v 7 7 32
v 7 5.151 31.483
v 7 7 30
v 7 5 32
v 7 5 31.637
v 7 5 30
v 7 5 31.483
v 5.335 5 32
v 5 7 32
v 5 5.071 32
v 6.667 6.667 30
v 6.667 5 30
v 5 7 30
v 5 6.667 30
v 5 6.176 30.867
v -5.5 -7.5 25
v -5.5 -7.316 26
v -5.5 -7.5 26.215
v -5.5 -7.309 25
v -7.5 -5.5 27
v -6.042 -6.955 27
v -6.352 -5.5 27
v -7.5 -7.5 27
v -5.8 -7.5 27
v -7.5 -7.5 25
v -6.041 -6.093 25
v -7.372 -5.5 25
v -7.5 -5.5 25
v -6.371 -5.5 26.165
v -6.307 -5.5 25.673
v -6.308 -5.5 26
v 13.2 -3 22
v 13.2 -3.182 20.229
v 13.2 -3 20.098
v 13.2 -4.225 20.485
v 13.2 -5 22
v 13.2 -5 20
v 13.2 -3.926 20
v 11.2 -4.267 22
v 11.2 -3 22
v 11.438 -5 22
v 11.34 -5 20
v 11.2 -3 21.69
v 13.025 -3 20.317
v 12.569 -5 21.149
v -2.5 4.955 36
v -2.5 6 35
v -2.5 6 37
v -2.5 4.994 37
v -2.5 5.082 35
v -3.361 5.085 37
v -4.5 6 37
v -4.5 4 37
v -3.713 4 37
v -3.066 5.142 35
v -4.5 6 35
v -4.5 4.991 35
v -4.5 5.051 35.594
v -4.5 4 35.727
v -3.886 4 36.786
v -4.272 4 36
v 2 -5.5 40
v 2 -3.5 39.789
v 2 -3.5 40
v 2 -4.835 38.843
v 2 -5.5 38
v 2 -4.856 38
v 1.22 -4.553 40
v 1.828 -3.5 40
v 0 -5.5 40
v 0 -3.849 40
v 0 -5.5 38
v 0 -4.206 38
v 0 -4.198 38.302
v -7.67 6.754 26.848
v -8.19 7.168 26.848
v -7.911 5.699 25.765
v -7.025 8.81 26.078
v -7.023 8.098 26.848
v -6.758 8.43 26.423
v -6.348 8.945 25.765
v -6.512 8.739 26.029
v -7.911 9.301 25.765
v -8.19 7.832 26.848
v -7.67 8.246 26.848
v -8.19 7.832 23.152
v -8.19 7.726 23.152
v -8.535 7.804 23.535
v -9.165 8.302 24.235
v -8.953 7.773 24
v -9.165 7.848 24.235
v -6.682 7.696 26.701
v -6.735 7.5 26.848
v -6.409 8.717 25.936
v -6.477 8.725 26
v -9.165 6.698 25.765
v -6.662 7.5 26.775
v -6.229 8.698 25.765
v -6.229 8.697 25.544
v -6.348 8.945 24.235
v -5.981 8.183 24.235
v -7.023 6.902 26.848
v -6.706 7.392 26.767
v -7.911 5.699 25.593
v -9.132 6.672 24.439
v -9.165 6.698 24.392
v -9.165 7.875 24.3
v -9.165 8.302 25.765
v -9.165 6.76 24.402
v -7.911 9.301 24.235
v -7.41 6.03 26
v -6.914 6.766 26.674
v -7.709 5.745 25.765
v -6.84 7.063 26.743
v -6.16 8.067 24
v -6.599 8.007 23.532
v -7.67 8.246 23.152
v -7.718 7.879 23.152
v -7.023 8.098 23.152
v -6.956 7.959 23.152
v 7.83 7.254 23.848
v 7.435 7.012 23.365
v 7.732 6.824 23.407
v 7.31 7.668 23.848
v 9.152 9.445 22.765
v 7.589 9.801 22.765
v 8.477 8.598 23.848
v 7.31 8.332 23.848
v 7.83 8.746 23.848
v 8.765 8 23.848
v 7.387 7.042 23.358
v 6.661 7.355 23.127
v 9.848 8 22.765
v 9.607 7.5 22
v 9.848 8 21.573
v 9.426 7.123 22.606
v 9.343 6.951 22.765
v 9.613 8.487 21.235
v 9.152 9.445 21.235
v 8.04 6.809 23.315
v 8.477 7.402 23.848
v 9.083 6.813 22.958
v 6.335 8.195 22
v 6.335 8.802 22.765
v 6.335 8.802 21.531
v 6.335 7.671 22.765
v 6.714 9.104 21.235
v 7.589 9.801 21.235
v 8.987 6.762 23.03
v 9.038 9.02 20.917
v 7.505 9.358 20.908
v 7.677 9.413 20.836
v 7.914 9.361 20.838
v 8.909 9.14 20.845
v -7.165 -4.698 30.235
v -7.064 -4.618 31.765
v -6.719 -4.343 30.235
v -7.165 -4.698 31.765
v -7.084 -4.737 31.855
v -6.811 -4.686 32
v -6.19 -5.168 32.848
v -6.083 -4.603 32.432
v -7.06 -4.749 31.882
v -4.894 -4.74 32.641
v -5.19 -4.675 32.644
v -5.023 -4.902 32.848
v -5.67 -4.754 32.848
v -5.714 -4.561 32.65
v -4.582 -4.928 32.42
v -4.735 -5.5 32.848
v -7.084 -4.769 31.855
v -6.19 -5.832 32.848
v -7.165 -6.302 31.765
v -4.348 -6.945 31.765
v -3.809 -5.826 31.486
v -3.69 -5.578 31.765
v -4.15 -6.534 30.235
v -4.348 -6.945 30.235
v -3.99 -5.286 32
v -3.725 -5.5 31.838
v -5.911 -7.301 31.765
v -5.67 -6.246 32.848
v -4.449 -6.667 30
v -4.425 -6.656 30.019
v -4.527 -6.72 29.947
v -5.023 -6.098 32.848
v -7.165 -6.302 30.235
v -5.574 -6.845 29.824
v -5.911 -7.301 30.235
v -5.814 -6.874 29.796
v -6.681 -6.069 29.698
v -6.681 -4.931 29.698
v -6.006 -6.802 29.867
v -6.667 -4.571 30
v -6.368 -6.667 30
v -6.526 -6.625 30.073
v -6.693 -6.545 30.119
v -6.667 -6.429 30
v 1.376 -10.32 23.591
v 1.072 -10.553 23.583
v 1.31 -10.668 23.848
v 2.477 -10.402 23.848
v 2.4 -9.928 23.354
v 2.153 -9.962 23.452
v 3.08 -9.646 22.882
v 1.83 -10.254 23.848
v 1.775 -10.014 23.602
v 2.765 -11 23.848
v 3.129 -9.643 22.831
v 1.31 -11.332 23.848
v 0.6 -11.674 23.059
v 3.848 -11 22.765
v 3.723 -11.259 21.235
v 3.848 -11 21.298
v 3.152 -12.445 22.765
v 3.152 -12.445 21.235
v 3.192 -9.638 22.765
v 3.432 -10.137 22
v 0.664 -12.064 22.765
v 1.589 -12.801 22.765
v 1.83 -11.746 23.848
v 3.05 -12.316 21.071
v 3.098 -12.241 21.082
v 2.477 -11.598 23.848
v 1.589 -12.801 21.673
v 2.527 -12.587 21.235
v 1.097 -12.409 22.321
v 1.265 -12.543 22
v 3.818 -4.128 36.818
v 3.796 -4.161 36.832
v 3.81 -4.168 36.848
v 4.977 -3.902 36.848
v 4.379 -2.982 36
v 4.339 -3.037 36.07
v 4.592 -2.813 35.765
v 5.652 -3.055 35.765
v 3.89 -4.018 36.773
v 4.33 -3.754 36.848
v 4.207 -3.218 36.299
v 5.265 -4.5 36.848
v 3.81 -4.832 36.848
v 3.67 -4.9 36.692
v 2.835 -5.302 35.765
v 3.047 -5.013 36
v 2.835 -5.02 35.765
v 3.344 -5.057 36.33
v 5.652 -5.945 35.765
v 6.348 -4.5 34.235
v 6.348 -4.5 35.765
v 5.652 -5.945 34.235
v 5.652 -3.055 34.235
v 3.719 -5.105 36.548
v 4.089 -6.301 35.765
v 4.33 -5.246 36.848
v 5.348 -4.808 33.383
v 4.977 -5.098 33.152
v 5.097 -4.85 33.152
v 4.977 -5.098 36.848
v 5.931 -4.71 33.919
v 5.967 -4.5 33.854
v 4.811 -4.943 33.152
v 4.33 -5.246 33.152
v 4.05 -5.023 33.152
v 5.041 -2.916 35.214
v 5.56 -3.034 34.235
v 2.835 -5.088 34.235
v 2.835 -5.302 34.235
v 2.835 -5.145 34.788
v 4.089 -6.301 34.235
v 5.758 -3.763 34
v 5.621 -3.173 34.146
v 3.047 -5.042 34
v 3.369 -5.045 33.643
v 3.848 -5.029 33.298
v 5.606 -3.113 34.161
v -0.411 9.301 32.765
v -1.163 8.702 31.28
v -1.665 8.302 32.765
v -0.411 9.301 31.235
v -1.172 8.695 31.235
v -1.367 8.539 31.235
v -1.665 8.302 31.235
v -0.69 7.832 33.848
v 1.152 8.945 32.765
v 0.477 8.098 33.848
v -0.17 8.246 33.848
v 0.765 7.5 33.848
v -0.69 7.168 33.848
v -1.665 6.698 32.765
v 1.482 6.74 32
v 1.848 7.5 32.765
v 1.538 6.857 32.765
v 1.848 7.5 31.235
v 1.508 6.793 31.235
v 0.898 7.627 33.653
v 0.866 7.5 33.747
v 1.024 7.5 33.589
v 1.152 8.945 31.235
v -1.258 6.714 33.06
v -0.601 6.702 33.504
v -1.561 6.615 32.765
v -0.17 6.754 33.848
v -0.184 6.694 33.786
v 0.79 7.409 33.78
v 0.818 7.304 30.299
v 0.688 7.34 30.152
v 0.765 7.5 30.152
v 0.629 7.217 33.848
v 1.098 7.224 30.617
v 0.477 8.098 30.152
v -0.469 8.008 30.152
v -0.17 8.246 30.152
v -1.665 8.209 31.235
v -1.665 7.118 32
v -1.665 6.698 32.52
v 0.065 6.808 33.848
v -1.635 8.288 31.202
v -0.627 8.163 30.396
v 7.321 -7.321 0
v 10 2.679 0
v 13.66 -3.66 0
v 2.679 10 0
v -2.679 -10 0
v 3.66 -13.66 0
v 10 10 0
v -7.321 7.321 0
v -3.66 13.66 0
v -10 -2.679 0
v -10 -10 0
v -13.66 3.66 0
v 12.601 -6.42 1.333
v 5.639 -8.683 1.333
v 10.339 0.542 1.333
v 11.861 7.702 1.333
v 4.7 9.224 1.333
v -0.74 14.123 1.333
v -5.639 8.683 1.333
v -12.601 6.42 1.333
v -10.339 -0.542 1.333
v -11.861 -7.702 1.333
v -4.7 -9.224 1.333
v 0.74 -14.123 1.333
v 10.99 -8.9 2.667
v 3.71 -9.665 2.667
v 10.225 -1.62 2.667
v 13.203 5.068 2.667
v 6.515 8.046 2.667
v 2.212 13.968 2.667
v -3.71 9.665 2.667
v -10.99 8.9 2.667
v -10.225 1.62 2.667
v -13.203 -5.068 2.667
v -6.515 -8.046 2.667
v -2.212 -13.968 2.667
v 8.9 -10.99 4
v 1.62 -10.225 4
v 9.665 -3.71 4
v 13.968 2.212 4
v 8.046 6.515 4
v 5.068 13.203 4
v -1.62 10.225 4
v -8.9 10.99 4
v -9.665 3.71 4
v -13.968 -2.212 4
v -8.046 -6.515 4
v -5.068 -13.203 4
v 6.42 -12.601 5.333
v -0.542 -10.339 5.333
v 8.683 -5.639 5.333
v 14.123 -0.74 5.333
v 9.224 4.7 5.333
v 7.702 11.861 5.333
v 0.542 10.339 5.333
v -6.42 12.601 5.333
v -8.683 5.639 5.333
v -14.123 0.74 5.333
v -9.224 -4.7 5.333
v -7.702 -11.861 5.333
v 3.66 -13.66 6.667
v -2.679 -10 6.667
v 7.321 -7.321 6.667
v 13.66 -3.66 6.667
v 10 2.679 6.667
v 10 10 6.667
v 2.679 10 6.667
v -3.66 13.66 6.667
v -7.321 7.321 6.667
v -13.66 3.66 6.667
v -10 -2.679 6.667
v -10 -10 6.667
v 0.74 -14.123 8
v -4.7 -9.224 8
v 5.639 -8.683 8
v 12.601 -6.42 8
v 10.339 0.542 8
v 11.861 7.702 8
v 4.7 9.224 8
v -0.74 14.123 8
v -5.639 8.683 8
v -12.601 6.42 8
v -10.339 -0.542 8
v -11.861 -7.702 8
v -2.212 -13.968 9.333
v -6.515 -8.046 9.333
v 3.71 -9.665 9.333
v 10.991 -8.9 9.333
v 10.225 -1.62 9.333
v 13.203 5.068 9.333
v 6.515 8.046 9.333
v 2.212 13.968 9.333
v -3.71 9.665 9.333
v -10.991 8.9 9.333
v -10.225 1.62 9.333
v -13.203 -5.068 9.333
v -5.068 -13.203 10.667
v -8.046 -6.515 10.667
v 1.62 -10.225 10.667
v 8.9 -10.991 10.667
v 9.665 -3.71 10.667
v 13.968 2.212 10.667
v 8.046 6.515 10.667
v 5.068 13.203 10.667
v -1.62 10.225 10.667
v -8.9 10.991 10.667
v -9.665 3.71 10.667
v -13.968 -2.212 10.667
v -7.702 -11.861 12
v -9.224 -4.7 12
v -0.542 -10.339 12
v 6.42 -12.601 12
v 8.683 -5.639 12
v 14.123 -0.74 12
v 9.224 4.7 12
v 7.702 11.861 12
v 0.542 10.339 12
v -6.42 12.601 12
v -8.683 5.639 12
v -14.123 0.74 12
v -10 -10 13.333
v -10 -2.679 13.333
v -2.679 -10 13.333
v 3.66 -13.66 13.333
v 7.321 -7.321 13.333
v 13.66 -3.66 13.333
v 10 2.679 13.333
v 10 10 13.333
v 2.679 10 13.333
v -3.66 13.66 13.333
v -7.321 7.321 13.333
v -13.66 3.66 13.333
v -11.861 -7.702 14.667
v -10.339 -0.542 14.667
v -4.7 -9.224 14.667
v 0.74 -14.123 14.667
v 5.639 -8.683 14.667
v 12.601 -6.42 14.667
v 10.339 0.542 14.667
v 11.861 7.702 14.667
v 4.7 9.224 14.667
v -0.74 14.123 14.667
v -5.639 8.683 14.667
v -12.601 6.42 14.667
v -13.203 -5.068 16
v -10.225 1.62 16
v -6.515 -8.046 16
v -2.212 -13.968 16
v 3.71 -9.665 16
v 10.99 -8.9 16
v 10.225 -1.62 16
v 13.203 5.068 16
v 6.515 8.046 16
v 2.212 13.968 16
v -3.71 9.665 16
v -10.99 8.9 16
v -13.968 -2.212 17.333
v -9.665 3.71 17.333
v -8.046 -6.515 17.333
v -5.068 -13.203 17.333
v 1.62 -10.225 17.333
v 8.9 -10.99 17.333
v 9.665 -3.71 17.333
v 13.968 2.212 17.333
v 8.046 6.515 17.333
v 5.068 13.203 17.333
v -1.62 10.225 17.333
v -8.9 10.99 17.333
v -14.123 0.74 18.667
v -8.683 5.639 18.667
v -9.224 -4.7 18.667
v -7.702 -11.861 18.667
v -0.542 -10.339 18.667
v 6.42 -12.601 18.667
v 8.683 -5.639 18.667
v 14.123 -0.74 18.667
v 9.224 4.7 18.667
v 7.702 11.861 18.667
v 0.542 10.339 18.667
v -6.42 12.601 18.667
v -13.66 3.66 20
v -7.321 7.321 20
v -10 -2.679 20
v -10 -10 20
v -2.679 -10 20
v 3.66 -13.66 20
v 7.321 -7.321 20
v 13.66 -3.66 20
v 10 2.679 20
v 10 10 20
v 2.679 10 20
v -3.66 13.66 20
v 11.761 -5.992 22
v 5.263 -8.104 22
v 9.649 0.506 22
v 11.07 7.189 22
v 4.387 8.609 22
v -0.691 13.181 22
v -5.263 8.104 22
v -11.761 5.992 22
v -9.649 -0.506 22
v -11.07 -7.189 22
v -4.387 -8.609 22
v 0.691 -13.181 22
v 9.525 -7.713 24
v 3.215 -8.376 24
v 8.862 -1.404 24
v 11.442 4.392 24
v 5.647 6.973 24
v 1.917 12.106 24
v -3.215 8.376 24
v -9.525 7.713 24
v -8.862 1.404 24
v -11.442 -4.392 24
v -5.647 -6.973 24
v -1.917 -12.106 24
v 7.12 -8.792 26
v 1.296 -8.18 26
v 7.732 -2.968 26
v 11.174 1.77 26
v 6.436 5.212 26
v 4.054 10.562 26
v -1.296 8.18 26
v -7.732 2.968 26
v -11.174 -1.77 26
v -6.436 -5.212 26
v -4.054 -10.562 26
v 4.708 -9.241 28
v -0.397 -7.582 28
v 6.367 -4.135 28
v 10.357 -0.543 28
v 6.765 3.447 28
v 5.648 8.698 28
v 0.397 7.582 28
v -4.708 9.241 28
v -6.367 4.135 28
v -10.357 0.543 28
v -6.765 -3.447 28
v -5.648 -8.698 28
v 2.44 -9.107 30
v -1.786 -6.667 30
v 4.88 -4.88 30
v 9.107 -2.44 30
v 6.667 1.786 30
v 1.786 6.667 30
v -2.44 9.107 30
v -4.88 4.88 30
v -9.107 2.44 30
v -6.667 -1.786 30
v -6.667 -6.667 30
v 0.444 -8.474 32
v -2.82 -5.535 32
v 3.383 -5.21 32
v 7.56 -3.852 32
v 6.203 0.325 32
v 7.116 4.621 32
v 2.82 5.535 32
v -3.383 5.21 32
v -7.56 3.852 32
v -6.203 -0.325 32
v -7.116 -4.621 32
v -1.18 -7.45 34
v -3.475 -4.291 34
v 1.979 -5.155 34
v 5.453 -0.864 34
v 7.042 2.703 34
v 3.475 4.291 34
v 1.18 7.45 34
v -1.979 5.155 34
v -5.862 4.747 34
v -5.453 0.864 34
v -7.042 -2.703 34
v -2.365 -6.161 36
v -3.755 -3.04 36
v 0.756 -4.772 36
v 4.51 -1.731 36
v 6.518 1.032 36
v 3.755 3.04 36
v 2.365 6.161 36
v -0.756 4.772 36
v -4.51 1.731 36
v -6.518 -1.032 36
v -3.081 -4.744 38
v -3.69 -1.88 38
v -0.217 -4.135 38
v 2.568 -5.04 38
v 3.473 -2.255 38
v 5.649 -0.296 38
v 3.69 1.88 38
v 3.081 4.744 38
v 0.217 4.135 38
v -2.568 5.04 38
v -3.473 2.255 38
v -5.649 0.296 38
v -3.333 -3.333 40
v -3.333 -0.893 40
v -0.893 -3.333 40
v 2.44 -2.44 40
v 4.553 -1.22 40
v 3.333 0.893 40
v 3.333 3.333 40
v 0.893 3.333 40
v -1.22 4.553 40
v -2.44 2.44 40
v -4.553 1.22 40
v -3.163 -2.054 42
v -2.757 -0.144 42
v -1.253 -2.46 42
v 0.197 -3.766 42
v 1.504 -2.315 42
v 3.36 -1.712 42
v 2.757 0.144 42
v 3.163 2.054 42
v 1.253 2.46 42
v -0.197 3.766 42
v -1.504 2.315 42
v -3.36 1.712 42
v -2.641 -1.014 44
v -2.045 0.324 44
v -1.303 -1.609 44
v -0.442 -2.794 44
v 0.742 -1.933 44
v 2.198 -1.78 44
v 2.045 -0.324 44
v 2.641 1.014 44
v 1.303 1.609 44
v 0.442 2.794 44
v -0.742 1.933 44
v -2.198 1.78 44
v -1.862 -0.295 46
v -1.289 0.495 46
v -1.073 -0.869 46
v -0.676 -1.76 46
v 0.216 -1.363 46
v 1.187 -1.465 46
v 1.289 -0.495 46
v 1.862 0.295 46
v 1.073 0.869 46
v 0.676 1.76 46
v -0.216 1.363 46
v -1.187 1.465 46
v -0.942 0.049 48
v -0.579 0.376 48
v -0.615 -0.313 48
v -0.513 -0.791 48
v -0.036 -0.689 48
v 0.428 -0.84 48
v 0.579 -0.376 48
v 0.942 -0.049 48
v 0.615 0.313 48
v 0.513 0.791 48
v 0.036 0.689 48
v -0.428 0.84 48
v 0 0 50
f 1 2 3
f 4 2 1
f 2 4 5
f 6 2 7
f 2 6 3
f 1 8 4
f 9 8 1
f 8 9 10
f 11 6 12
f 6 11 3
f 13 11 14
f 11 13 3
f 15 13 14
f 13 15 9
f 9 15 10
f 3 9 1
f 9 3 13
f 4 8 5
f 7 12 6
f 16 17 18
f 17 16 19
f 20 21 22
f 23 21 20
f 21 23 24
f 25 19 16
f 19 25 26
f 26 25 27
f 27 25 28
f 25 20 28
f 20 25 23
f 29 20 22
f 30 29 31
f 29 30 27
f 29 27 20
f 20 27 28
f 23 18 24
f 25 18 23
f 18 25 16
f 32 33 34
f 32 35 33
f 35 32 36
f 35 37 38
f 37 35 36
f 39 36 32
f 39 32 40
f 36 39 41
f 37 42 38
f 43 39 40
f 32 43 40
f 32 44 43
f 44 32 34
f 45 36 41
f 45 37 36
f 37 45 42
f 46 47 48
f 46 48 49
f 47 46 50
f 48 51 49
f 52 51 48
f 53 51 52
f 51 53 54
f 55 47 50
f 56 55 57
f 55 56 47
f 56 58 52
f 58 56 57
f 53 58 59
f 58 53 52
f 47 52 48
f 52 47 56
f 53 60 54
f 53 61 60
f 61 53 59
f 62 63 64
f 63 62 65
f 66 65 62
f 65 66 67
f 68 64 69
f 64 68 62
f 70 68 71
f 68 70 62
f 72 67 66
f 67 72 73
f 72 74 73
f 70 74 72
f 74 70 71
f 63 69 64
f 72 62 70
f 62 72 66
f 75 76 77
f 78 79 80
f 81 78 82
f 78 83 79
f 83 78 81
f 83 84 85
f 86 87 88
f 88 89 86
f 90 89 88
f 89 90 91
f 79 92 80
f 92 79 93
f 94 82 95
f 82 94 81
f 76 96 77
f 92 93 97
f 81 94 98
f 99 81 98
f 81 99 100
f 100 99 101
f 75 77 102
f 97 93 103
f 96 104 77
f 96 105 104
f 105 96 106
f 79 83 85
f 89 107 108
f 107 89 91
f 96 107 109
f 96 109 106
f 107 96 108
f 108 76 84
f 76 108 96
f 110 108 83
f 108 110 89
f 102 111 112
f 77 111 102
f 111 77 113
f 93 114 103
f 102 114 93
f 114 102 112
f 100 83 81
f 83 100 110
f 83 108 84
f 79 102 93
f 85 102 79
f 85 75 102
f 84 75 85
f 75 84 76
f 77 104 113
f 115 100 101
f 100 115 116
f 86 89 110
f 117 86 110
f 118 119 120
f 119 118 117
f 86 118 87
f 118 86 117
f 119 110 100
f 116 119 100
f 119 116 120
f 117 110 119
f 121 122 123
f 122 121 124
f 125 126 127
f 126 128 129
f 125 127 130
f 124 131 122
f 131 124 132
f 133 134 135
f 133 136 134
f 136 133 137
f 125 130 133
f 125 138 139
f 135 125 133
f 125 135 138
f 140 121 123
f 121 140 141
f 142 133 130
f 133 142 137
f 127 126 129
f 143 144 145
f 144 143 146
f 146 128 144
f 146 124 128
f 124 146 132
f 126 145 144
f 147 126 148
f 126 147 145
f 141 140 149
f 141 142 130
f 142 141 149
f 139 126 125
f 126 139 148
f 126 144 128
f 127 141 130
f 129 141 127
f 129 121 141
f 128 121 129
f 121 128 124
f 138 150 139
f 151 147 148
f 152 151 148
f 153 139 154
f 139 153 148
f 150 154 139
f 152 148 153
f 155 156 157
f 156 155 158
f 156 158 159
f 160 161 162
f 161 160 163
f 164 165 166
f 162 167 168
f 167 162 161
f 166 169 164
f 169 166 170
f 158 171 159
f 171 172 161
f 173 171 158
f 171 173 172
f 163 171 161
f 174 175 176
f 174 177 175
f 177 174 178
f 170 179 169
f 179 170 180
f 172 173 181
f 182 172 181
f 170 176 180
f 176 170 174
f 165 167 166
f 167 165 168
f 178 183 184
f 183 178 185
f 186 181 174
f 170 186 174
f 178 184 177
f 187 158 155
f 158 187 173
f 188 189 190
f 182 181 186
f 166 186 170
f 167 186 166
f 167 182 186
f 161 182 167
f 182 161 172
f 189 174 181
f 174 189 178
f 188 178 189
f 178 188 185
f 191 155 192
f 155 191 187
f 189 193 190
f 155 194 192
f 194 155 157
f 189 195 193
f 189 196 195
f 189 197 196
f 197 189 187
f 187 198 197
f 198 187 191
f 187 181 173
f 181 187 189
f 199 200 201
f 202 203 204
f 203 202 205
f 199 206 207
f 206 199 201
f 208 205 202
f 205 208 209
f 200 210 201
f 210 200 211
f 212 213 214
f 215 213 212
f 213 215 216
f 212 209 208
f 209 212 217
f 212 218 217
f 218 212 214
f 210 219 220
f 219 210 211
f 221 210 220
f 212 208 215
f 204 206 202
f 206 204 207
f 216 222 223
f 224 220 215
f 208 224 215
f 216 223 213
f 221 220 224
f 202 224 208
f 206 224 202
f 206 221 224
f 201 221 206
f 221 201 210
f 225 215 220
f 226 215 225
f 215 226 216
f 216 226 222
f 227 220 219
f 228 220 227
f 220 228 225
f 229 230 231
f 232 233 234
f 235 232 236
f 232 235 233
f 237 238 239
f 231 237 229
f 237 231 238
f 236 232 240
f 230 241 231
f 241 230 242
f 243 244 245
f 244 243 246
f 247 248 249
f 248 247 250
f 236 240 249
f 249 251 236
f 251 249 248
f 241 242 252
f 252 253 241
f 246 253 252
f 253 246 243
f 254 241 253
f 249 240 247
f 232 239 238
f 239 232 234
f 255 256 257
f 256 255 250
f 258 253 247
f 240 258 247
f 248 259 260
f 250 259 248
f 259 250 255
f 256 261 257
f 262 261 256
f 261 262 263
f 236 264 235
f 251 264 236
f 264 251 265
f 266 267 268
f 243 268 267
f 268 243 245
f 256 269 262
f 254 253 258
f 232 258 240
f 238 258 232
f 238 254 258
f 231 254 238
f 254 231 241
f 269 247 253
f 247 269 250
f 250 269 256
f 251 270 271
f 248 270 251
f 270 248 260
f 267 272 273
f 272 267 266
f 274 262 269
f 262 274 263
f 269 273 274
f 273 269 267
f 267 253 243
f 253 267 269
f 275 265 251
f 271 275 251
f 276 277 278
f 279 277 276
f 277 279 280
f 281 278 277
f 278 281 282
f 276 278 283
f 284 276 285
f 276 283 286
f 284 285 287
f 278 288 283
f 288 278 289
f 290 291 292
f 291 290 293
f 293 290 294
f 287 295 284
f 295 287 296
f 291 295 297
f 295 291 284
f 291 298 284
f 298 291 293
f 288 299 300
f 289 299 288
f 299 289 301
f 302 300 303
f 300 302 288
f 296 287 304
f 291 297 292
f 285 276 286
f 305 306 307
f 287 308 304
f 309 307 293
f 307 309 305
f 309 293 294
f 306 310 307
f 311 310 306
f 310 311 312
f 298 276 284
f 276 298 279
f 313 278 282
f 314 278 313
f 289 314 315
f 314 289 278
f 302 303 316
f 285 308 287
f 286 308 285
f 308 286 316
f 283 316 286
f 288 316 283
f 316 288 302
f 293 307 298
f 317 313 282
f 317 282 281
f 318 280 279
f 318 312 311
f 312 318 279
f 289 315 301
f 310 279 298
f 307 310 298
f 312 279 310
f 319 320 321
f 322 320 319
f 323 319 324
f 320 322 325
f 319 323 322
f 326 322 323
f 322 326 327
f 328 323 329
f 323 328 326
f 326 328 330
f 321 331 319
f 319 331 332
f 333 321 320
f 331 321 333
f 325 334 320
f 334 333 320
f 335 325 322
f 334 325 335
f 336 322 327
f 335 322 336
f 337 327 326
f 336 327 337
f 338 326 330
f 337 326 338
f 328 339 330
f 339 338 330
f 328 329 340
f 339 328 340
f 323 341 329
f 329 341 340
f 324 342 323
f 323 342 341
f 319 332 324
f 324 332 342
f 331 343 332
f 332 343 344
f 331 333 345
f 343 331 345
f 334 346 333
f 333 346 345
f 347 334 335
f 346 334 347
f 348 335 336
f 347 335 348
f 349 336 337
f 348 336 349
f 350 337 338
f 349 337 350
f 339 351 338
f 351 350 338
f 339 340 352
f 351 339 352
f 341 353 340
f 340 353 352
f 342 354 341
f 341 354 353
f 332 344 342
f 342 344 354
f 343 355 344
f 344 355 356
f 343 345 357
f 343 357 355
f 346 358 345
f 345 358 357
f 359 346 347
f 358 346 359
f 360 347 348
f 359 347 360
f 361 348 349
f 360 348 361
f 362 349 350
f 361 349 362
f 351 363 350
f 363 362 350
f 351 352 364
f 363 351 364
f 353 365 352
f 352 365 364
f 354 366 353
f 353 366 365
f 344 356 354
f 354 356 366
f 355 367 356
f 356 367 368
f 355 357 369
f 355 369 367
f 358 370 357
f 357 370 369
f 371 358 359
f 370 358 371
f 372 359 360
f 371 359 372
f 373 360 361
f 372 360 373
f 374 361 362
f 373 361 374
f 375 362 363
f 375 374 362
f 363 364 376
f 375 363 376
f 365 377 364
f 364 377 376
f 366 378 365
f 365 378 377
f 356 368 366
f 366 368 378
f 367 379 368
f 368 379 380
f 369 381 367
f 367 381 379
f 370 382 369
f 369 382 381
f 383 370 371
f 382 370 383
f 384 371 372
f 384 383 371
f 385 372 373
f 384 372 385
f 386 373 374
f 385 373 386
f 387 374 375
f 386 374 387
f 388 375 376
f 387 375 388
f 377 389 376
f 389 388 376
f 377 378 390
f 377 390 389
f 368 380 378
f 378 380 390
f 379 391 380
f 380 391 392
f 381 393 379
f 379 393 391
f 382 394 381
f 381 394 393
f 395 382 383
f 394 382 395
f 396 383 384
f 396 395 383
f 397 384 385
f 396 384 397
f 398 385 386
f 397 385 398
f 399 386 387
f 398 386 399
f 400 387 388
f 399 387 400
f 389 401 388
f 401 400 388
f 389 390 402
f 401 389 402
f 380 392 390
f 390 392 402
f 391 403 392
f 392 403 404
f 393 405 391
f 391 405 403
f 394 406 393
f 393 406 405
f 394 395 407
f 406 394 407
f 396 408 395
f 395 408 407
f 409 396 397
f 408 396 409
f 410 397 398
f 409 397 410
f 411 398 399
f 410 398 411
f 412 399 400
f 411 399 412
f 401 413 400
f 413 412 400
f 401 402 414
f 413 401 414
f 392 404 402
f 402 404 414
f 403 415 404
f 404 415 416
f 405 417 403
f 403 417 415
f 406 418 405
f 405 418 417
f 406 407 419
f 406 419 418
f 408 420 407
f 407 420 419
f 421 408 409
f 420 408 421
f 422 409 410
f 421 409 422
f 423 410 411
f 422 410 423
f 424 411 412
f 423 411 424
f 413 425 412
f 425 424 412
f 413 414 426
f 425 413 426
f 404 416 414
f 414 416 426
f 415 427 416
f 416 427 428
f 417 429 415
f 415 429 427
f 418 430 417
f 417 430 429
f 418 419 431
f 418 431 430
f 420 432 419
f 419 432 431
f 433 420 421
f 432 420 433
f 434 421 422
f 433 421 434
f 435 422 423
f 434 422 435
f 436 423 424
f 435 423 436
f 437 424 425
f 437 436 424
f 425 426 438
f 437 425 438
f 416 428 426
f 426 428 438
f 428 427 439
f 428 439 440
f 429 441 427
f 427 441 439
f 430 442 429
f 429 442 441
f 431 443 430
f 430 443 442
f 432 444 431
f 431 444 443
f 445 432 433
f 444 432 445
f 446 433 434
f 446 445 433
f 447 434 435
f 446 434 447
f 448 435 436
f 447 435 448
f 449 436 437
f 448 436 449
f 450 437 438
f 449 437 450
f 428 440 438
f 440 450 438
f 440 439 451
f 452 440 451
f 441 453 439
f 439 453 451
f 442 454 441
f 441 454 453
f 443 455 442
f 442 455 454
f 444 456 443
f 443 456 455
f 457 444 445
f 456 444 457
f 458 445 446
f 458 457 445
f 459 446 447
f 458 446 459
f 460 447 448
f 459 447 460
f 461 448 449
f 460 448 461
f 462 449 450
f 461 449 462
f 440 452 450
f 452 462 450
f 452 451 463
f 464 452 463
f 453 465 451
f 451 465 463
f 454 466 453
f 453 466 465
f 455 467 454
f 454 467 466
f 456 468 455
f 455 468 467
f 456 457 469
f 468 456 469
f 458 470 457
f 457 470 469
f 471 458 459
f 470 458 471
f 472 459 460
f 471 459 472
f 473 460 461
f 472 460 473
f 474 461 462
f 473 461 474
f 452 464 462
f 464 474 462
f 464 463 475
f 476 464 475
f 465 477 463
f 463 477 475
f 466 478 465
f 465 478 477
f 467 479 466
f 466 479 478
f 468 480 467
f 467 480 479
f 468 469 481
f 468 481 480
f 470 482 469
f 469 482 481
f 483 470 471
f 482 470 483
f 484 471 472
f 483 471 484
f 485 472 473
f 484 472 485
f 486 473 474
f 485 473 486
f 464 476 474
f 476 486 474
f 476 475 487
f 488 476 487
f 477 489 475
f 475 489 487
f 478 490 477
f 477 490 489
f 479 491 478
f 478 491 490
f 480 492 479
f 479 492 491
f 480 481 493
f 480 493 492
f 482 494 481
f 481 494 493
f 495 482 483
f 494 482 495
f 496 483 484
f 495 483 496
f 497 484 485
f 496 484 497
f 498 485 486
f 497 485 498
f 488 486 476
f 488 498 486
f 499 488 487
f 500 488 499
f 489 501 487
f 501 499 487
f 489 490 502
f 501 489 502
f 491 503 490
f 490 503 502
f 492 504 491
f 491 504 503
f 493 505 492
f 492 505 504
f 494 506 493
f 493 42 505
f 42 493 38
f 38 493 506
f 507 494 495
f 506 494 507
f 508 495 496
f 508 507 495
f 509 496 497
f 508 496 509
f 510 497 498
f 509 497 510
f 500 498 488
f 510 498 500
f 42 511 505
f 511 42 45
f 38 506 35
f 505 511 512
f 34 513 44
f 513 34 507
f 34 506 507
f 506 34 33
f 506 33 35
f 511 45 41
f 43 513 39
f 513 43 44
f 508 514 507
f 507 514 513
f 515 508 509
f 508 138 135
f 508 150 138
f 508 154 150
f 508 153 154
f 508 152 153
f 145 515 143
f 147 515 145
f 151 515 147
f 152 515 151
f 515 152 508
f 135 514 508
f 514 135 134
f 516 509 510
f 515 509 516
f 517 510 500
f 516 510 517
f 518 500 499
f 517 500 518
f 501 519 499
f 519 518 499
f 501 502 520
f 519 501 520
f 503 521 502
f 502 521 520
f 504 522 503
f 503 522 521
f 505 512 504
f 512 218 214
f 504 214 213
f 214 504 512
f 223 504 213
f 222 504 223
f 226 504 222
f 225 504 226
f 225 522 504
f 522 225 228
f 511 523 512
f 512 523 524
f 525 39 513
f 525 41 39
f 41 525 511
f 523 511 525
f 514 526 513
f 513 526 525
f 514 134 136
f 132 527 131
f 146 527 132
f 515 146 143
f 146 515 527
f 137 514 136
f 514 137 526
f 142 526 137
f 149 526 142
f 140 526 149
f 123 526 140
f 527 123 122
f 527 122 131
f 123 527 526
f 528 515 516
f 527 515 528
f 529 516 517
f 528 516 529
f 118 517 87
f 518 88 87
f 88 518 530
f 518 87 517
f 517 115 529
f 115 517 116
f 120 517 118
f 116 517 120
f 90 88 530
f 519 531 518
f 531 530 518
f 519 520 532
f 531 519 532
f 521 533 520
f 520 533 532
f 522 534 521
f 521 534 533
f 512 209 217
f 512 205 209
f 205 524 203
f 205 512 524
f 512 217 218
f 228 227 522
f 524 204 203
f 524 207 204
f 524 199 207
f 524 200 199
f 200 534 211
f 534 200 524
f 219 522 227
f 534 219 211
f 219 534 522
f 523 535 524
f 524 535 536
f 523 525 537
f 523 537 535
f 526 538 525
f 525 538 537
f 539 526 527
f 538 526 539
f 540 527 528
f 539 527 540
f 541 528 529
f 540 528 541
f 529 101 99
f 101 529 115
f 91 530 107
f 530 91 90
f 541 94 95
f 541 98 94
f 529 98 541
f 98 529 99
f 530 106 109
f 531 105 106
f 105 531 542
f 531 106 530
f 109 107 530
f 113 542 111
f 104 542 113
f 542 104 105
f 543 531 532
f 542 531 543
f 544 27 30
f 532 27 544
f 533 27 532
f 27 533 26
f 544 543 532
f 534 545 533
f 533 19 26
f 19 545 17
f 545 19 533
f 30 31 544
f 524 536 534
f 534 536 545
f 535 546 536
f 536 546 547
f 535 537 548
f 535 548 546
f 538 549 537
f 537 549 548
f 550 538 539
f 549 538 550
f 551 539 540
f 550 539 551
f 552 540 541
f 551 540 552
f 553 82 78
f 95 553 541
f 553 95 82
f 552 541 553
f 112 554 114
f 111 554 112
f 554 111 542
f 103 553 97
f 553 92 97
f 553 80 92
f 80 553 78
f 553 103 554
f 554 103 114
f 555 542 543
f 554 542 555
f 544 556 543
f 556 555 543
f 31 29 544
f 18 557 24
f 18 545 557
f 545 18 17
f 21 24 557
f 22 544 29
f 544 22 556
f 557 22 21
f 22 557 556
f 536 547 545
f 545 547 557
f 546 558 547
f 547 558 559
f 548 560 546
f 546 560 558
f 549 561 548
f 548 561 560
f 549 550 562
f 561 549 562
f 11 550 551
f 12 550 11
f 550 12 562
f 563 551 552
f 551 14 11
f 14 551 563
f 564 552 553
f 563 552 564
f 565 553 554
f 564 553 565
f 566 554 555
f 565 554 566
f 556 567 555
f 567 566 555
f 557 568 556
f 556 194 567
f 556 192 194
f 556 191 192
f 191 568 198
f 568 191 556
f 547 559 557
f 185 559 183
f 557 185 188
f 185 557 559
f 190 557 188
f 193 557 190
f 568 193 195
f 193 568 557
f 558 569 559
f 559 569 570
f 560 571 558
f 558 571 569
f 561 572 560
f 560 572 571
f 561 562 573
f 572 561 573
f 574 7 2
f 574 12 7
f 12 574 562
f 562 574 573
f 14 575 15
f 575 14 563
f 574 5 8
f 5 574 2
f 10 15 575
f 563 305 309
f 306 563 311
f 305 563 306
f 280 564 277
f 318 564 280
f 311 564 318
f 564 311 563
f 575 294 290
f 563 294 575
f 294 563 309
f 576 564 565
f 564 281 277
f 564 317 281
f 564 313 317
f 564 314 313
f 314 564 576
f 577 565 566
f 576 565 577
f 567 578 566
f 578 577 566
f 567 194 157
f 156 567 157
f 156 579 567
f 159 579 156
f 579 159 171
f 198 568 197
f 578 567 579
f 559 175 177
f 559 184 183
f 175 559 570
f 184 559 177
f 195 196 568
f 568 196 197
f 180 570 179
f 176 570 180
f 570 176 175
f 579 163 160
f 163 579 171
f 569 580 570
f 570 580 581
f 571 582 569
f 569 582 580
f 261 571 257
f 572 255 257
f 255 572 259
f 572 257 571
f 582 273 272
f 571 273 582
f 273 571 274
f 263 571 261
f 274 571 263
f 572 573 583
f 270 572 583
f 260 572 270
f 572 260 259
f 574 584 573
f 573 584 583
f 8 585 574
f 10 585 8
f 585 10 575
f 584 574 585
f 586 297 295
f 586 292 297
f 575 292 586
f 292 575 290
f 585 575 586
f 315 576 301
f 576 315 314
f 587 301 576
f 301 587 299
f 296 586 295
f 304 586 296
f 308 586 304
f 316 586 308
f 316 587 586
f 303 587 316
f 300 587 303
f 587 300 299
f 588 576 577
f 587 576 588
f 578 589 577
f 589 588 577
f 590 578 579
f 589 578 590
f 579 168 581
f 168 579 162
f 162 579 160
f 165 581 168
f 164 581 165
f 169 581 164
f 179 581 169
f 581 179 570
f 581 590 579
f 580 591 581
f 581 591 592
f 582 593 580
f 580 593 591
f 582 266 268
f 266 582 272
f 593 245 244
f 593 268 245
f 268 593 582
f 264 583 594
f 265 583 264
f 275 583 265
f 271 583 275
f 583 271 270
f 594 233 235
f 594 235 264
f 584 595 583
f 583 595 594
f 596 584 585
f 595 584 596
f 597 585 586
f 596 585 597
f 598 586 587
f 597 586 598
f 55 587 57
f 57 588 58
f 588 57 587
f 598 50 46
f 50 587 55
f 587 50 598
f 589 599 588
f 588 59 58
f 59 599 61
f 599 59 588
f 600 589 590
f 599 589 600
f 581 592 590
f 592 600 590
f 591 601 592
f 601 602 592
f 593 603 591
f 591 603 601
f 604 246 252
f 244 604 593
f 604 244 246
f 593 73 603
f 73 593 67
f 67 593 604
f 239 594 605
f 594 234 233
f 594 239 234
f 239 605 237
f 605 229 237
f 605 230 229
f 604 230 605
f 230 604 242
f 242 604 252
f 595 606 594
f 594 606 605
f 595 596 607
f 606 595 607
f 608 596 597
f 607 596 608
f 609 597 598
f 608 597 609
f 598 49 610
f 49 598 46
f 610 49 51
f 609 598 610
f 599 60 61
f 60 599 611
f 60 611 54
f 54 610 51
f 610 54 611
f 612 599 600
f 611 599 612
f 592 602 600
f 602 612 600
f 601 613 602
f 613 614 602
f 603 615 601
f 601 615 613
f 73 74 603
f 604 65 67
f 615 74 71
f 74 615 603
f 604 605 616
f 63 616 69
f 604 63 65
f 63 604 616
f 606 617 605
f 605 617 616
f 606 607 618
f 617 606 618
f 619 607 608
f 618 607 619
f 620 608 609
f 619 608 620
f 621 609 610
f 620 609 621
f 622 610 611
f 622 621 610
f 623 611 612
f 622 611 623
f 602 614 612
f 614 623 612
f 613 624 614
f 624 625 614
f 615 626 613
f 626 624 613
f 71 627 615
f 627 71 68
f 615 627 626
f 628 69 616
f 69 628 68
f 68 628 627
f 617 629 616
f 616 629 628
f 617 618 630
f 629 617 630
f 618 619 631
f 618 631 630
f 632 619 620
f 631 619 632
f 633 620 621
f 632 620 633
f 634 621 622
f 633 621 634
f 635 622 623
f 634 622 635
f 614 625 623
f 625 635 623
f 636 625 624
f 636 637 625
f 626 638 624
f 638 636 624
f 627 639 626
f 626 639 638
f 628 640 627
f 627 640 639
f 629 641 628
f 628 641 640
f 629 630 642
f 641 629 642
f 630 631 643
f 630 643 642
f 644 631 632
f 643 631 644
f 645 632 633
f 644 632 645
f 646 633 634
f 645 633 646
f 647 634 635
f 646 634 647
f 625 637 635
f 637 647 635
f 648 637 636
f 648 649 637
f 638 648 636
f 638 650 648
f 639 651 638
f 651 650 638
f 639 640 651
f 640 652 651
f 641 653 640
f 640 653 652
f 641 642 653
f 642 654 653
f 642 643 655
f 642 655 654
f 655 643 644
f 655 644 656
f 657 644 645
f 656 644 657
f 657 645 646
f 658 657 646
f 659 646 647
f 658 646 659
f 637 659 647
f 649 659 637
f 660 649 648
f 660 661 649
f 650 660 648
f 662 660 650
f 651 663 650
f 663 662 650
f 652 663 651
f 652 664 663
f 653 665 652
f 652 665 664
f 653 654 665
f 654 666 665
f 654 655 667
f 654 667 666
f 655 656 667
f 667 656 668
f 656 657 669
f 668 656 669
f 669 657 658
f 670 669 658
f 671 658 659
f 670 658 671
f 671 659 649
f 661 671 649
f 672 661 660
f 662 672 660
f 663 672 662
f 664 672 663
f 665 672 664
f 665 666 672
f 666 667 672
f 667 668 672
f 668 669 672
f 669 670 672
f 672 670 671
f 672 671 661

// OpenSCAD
// Module représentant le sommet de la glace
module Glace_Sommet(height = 30, twist = 180, scale_factor = [0, 0]) {
    color("coral")
      translate([0, 0, 20]){
        linear_extrude(height = height, twist = twist,
          scale = scale_factor, center = false) {
          for (i = [1 : abs(1) : 6]) {
            rotate([0, 0, (60 * i)]){
              square([10, 10], center=false);
            }
          }

        }
      }
}

// Module représentant la partie principale de la glace
module Glace(height = 20, twist = 180, scale_factor = [1, 1]) {
  color("crimson") {
     linear_extrude(height = height, twist = twist,
      scale = scale_factor, center = false){
      for (i = [1 : abs(1) : 6]) {
        rotate([0, 0, (60 * i)]){
          square([10, 10], center=false);
        }
      }

    }
  }
}

module EclatDeChocolat(x, y, z) {
    translate([x, y, z]) {
        color("black") {
            cube([2, 2, 2]);
        }
    }
}

module MorceauDeFruit(x, y, z, couleur = [0, 1, 0]) {
    translate([x, y, z]) {
        color(couleur) {
            sphere(2);
        }
    }
}
module Garniture(){
    EclatDeChocolat(5, 5, 30);
    EclatDeChocolat(-7.5, -7.5, 25);
    EclatDeChocolat(11.2, -5, 20);
    EclatDeChocolat(-4.5, 4, 35);
    EclatDeChocolat(0, -5.5, 38);
    
    // Ajout de morceaux de fruits
    MorceauDeFruit(-7.5, 7.5, 25, , "yellow");
    MorceauDeFruit(8, 8, 22, , "orange");
    MorceauDeFruit(-5.5, -5.5, 31, "purple");
    MorceauDeFruit(2, -11, 22, "red");
    MorceauDeFruit(4.5, -4.5, 35, "chocolate");
    MorceauDeFruit(0, 7.5, 32);
}


Glace();
Glace_Sommet();
Garniture();
